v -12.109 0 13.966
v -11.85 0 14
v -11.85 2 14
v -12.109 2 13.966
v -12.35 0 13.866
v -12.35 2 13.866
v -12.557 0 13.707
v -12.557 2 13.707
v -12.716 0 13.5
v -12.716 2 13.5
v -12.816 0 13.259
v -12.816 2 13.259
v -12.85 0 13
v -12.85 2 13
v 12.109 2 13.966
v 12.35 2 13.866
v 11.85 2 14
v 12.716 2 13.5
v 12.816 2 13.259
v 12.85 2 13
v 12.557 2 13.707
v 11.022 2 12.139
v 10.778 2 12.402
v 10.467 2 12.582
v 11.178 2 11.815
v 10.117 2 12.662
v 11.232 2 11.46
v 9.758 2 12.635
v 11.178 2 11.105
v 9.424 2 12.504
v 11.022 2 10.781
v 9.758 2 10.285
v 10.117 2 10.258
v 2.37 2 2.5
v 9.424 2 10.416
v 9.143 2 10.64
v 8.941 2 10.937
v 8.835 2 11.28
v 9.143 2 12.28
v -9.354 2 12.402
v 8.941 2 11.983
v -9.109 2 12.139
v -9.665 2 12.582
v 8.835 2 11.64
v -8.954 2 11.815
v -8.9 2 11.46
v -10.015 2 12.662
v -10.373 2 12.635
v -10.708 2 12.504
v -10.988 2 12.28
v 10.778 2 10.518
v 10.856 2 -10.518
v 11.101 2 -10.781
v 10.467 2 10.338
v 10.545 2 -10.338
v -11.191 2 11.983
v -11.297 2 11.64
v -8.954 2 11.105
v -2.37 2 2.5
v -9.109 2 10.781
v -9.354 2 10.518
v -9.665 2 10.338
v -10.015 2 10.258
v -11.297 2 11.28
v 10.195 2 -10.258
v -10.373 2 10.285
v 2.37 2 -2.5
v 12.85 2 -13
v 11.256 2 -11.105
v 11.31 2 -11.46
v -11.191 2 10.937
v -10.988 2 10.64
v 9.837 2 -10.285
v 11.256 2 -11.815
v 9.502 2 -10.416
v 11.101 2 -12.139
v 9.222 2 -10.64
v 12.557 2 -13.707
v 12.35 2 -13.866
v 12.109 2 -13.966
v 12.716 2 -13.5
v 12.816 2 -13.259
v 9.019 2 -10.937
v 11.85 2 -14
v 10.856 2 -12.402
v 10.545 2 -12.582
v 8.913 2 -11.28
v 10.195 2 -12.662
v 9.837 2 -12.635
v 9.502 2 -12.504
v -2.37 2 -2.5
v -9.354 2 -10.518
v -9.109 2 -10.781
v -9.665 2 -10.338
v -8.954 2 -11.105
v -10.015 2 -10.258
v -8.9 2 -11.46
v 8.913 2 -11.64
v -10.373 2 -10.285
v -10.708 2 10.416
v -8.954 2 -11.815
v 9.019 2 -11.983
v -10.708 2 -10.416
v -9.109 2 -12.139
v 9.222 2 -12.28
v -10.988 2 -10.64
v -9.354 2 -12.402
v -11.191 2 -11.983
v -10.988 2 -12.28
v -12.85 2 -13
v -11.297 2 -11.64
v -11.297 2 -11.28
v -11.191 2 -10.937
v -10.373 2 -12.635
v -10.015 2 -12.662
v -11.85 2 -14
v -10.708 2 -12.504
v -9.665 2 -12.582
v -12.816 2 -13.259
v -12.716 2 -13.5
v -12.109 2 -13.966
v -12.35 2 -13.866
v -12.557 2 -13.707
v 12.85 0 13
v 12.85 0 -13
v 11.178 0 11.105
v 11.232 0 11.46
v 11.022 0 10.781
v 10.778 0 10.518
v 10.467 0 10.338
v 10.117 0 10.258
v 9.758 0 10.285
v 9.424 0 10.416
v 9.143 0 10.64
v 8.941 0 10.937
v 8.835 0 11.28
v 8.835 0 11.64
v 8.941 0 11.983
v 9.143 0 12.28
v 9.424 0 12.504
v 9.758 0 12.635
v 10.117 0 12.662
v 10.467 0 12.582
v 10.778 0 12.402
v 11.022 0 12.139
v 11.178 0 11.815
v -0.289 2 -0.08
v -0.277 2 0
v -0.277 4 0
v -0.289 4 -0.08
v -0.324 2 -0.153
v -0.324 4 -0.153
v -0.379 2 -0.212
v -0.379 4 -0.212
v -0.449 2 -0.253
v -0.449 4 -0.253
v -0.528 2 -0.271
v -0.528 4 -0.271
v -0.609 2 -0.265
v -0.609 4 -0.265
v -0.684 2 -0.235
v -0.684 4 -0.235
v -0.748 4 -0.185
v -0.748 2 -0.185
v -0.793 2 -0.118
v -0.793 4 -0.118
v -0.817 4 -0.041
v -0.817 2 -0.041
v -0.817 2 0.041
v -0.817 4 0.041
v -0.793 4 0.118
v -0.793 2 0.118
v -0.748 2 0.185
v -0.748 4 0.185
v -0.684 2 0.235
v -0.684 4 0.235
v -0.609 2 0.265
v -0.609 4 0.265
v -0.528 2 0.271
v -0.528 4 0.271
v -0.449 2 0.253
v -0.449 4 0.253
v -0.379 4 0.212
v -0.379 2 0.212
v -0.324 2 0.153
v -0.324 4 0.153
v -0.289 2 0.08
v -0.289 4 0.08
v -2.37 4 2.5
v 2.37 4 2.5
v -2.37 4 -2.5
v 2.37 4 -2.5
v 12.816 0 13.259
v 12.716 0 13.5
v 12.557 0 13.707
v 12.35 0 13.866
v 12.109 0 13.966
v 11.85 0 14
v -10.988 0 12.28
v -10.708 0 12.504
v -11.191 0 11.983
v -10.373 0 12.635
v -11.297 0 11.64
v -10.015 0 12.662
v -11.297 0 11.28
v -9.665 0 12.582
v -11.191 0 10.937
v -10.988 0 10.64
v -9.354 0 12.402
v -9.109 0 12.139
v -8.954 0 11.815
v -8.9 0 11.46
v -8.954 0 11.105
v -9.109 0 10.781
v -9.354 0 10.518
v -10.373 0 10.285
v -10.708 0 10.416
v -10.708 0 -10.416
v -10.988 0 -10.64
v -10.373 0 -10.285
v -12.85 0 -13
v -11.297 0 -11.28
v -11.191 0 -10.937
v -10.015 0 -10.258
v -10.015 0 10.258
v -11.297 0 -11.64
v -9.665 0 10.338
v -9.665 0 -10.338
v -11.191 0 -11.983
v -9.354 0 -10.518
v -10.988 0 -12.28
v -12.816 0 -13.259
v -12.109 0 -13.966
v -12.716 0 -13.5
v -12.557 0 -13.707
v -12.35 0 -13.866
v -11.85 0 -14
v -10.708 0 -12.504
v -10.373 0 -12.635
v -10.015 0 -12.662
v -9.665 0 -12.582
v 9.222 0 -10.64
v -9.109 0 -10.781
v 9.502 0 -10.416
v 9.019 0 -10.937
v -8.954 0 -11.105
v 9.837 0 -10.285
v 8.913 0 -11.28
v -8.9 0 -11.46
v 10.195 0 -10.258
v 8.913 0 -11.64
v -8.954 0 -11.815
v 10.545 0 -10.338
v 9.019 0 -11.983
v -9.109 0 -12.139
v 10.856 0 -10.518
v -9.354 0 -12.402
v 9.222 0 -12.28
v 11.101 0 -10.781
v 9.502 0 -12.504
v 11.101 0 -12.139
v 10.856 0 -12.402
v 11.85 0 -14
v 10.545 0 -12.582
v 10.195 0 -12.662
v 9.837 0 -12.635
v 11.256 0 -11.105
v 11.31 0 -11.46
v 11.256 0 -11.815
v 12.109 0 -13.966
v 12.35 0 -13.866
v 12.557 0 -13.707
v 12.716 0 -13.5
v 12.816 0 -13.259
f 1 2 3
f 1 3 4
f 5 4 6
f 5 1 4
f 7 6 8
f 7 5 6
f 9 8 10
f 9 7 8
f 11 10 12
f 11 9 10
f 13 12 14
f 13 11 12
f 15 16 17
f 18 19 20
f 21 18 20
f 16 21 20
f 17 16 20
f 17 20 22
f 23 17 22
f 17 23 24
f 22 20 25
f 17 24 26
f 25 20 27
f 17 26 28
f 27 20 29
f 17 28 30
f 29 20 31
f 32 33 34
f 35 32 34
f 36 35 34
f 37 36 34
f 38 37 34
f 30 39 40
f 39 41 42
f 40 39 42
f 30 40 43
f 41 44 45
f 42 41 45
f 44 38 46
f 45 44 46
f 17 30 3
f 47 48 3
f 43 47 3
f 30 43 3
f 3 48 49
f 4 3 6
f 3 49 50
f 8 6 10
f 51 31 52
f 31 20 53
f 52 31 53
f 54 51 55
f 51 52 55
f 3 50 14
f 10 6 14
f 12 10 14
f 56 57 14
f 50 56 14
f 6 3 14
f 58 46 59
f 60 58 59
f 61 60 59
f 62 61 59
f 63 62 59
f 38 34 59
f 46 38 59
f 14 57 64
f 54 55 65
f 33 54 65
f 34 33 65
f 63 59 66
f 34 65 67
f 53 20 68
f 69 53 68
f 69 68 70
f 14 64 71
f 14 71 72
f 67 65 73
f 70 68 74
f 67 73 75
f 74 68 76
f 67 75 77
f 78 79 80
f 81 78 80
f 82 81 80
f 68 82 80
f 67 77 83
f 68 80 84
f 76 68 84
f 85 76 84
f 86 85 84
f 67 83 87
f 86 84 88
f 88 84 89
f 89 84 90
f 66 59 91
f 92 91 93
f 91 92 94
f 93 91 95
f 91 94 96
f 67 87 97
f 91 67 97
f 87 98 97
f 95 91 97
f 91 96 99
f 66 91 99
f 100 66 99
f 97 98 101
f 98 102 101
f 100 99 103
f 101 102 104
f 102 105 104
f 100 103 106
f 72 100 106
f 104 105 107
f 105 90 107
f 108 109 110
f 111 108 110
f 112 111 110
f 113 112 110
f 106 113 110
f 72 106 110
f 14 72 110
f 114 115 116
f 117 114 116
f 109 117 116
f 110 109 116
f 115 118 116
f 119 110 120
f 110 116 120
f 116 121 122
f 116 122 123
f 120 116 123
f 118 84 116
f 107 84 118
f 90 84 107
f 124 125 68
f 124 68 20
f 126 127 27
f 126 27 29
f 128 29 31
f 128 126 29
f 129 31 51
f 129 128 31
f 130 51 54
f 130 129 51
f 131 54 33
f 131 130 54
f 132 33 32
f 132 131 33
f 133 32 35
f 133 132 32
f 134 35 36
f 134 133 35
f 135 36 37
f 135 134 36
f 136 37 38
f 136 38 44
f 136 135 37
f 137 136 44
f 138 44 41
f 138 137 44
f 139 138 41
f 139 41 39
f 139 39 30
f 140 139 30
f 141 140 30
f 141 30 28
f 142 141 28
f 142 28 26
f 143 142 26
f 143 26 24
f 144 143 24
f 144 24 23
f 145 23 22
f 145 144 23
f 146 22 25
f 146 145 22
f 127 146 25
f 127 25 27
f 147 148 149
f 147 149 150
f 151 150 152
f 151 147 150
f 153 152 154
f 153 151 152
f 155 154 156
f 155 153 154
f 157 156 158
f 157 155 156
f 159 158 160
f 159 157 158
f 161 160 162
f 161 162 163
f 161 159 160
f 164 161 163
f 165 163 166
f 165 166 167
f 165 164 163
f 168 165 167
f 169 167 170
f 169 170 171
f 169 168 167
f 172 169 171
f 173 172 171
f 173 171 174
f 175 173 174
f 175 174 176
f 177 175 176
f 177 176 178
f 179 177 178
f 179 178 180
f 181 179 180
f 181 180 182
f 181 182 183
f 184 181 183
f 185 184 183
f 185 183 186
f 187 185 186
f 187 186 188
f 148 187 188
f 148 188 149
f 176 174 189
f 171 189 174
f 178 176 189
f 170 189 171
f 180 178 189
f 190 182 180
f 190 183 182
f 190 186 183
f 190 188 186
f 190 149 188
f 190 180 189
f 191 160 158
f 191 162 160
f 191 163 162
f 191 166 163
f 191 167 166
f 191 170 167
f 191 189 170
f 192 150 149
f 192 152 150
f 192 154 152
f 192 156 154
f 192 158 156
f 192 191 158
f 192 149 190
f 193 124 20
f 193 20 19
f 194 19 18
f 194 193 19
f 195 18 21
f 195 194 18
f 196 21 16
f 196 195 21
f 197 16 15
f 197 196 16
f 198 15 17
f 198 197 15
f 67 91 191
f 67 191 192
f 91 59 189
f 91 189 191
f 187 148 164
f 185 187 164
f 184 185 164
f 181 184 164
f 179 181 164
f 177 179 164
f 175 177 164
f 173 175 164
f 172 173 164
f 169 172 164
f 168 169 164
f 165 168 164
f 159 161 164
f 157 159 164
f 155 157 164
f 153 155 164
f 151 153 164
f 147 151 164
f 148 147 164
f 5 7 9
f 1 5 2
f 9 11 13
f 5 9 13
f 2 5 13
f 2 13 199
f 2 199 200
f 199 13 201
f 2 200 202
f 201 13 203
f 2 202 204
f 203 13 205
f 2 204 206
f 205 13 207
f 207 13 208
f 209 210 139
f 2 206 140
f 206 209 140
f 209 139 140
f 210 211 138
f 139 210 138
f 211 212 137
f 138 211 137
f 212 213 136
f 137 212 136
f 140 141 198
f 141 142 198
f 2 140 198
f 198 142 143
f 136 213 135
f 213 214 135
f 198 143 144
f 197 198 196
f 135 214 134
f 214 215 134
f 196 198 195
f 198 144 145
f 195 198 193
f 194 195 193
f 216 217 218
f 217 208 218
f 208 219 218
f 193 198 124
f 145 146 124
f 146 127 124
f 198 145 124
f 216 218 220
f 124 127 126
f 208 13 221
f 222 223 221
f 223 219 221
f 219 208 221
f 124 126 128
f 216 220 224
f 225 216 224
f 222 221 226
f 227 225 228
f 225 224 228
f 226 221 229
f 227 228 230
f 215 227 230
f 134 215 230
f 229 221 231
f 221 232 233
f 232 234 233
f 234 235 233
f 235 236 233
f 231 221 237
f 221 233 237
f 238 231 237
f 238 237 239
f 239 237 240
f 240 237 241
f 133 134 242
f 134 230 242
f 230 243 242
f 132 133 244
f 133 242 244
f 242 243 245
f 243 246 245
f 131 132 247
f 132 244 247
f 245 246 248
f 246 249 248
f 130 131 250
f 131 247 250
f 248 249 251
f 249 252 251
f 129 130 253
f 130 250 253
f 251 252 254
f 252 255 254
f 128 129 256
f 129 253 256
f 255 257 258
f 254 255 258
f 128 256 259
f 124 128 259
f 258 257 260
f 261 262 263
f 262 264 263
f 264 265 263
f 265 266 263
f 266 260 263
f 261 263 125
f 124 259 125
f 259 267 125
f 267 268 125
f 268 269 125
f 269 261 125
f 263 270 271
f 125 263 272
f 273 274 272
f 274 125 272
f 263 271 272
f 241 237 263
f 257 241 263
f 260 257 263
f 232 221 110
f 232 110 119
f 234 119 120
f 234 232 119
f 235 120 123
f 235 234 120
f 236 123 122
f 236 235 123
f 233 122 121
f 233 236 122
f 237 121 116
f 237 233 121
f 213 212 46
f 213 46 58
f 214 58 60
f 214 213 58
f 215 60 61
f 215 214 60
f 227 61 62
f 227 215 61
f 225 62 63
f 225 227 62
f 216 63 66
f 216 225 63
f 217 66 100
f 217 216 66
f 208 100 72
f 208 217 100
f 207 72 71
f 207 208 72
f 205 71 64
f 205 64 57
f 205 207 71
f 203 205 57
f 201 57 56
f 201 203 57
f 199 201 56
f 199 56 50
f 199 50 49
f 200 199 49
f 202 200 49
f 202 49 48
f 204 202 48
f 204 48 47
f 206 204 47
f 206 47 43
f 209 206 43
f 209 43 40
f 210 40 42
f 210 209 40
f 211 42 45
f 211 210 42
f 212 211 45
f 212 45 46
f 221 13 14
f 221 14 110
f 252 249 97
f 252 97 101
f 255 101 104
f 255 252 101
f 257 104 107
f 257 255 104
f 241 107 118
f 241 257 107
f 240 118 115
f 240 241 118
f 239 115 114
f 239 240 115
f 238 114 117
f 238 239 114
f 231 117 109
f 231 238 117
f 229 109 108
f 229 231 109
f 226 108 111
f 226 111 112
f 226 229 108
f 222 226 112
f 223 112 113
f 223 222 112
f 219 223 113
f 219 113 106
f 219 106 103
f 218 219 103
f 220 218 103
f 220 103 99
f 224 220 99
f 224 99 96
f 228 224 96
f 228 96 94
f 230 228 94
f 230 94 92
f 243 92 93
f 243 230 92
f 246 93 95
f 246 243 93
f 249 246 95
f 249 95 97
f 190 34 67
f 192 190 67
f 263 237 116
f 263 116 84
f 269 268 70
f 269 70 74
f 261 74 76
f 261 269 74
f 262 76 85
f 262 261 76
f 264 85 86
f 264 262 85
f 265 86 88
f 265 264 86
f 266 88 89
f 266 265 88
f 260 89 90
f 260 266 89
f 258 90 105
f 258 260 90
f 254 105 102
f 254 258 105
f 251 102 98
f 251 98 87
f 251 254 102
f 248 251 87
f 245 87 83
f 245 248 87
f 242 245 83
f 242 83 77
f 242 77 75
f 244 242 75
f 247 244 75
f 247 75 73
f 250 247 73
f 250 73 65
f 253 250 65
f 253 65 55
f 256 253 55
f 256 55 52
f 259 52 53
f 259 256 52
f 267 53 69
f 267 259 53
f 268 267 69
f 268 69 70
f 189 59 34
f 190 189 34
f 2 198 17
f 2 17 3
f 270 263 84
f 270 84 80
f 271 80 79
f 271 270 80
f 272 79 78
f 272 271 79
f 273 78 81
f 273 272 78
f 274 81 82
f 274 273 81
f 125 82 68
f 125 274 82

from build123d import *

# Parameters (mm, degrees)
SKETCH1_R           = 1.205
BOSS_EXTRUDE1_DEPTH = 2
SKETCH2_W           = 4.74
SKETCH2_H           = 5
SKETCH2_R           = 0.271758231
BOSS_EXTRUDE2_DEPTH = 4


with BuildPart() as part:
    # Sketch1 → Boss-Extrude1 (new body)
    with BuildSketch(Plane(origin=(0, 0, 0), x_dir=(1, 0, 0), z_dir=(0, 1, 0))):
        with BuildLine():
            Line((-11.85, 14), (11.85, 14))
            ThreePointArc((11.85, 14), (12.557106781, 13.707106781), (12.85, 13))
            Line((12.85, 13), (12.85, -13))
            ThreePointArc((12.85, -13), (12.557106781, -13.707106781), (11.85, -14))
            Line((11.85, -14), (-11.85, -14))
            ThreePointArc((-11.85, -14), (-12.557106781, -13.707106781), (-12.85, -13))
            Line((-12.85, -13), (-12.85, 13))
            ThreePointArc((-12.85, 13), (-12.557106781, 13.707106781), (-11.85, 14))
        make_face()
        with Locations((-10.105, 11.46)):
            Circle(SKETCH1_R, mode=Mode.SUBTRACT)
        with Locations((-10.105, -11.46)):
            Circle(SKETCH1_R, mode=Mode.SUBTRACT)
        with Locations((10.026555832, -11.46)):
            Circle(SKETCH1_R, mode=Mode.SUBTRACT)
        with Locations((10.105, 11.46)):
            Circle(SKETCH1_R, mode=Mode.SUBTRACT)
    extrude(amount=BOSS_EXTRUDE1_DEPTH)

    # Sketch2 → Boss-Extrude2 (add)
    with BuildSketch(Plane(origin=(0, 0, 0), x_dir=(1, 0, 0), z_dir=(0, 1, 0))):
        Rectangle(SKETCH2_W, SKETCH2_H)
        with Locations((-0.548413106, 0)):
            Circle(SKETCH2_R, mode=Mode.SUBTRACT)
    extrude(amount=BOSS_EXTRUDE2_DEPTH)


solid = part.part
